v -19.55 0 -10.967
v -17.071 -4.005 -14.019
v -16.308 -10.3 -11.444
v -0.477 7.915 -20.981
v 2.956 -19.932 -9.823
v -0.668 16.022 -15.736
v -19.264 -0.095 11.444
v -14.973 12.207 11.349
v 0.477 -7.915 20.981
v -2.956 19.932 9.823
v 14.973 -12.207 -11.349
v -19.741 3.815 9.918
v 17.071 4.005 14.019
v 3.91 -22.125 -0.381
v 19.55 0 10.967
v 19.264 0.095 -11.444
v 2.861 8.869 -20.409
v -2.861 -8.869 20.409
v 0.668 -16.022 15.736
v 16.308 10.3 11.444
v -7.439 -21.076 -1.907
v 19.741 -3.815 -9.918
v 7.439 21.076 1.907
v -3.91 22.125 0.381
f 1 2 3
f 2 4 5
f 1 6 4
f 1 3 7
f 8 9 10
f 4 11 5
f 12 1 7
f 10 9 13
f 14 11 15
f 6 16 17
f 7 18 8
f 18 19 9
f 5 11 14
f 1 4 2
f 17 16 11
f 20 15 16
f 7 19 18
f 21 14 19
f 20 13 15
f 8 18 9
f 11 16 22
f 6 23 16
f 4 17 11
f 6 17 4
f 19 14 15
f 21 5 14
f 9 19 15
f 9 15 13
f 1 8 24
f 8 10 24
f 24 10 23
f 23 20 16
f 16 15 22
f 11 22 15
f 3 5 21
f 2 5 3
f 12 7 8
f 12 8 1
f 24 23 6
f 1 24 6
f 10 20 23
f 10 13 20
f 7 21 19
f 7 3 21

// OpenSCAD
simplyfy() hull()union(){
rotate(rands(0,360,3))    cube(26,true);
rotate(rands(0,360,3))    cube(26,true);
rotate(rands(0,360,3))    cube(26,true);
};

module simplyfy(lim=100000)
scale(lim)
render()union(){
  color("blue")  sphere(.1/lim);
 scale(1/lim)render()children();
}
